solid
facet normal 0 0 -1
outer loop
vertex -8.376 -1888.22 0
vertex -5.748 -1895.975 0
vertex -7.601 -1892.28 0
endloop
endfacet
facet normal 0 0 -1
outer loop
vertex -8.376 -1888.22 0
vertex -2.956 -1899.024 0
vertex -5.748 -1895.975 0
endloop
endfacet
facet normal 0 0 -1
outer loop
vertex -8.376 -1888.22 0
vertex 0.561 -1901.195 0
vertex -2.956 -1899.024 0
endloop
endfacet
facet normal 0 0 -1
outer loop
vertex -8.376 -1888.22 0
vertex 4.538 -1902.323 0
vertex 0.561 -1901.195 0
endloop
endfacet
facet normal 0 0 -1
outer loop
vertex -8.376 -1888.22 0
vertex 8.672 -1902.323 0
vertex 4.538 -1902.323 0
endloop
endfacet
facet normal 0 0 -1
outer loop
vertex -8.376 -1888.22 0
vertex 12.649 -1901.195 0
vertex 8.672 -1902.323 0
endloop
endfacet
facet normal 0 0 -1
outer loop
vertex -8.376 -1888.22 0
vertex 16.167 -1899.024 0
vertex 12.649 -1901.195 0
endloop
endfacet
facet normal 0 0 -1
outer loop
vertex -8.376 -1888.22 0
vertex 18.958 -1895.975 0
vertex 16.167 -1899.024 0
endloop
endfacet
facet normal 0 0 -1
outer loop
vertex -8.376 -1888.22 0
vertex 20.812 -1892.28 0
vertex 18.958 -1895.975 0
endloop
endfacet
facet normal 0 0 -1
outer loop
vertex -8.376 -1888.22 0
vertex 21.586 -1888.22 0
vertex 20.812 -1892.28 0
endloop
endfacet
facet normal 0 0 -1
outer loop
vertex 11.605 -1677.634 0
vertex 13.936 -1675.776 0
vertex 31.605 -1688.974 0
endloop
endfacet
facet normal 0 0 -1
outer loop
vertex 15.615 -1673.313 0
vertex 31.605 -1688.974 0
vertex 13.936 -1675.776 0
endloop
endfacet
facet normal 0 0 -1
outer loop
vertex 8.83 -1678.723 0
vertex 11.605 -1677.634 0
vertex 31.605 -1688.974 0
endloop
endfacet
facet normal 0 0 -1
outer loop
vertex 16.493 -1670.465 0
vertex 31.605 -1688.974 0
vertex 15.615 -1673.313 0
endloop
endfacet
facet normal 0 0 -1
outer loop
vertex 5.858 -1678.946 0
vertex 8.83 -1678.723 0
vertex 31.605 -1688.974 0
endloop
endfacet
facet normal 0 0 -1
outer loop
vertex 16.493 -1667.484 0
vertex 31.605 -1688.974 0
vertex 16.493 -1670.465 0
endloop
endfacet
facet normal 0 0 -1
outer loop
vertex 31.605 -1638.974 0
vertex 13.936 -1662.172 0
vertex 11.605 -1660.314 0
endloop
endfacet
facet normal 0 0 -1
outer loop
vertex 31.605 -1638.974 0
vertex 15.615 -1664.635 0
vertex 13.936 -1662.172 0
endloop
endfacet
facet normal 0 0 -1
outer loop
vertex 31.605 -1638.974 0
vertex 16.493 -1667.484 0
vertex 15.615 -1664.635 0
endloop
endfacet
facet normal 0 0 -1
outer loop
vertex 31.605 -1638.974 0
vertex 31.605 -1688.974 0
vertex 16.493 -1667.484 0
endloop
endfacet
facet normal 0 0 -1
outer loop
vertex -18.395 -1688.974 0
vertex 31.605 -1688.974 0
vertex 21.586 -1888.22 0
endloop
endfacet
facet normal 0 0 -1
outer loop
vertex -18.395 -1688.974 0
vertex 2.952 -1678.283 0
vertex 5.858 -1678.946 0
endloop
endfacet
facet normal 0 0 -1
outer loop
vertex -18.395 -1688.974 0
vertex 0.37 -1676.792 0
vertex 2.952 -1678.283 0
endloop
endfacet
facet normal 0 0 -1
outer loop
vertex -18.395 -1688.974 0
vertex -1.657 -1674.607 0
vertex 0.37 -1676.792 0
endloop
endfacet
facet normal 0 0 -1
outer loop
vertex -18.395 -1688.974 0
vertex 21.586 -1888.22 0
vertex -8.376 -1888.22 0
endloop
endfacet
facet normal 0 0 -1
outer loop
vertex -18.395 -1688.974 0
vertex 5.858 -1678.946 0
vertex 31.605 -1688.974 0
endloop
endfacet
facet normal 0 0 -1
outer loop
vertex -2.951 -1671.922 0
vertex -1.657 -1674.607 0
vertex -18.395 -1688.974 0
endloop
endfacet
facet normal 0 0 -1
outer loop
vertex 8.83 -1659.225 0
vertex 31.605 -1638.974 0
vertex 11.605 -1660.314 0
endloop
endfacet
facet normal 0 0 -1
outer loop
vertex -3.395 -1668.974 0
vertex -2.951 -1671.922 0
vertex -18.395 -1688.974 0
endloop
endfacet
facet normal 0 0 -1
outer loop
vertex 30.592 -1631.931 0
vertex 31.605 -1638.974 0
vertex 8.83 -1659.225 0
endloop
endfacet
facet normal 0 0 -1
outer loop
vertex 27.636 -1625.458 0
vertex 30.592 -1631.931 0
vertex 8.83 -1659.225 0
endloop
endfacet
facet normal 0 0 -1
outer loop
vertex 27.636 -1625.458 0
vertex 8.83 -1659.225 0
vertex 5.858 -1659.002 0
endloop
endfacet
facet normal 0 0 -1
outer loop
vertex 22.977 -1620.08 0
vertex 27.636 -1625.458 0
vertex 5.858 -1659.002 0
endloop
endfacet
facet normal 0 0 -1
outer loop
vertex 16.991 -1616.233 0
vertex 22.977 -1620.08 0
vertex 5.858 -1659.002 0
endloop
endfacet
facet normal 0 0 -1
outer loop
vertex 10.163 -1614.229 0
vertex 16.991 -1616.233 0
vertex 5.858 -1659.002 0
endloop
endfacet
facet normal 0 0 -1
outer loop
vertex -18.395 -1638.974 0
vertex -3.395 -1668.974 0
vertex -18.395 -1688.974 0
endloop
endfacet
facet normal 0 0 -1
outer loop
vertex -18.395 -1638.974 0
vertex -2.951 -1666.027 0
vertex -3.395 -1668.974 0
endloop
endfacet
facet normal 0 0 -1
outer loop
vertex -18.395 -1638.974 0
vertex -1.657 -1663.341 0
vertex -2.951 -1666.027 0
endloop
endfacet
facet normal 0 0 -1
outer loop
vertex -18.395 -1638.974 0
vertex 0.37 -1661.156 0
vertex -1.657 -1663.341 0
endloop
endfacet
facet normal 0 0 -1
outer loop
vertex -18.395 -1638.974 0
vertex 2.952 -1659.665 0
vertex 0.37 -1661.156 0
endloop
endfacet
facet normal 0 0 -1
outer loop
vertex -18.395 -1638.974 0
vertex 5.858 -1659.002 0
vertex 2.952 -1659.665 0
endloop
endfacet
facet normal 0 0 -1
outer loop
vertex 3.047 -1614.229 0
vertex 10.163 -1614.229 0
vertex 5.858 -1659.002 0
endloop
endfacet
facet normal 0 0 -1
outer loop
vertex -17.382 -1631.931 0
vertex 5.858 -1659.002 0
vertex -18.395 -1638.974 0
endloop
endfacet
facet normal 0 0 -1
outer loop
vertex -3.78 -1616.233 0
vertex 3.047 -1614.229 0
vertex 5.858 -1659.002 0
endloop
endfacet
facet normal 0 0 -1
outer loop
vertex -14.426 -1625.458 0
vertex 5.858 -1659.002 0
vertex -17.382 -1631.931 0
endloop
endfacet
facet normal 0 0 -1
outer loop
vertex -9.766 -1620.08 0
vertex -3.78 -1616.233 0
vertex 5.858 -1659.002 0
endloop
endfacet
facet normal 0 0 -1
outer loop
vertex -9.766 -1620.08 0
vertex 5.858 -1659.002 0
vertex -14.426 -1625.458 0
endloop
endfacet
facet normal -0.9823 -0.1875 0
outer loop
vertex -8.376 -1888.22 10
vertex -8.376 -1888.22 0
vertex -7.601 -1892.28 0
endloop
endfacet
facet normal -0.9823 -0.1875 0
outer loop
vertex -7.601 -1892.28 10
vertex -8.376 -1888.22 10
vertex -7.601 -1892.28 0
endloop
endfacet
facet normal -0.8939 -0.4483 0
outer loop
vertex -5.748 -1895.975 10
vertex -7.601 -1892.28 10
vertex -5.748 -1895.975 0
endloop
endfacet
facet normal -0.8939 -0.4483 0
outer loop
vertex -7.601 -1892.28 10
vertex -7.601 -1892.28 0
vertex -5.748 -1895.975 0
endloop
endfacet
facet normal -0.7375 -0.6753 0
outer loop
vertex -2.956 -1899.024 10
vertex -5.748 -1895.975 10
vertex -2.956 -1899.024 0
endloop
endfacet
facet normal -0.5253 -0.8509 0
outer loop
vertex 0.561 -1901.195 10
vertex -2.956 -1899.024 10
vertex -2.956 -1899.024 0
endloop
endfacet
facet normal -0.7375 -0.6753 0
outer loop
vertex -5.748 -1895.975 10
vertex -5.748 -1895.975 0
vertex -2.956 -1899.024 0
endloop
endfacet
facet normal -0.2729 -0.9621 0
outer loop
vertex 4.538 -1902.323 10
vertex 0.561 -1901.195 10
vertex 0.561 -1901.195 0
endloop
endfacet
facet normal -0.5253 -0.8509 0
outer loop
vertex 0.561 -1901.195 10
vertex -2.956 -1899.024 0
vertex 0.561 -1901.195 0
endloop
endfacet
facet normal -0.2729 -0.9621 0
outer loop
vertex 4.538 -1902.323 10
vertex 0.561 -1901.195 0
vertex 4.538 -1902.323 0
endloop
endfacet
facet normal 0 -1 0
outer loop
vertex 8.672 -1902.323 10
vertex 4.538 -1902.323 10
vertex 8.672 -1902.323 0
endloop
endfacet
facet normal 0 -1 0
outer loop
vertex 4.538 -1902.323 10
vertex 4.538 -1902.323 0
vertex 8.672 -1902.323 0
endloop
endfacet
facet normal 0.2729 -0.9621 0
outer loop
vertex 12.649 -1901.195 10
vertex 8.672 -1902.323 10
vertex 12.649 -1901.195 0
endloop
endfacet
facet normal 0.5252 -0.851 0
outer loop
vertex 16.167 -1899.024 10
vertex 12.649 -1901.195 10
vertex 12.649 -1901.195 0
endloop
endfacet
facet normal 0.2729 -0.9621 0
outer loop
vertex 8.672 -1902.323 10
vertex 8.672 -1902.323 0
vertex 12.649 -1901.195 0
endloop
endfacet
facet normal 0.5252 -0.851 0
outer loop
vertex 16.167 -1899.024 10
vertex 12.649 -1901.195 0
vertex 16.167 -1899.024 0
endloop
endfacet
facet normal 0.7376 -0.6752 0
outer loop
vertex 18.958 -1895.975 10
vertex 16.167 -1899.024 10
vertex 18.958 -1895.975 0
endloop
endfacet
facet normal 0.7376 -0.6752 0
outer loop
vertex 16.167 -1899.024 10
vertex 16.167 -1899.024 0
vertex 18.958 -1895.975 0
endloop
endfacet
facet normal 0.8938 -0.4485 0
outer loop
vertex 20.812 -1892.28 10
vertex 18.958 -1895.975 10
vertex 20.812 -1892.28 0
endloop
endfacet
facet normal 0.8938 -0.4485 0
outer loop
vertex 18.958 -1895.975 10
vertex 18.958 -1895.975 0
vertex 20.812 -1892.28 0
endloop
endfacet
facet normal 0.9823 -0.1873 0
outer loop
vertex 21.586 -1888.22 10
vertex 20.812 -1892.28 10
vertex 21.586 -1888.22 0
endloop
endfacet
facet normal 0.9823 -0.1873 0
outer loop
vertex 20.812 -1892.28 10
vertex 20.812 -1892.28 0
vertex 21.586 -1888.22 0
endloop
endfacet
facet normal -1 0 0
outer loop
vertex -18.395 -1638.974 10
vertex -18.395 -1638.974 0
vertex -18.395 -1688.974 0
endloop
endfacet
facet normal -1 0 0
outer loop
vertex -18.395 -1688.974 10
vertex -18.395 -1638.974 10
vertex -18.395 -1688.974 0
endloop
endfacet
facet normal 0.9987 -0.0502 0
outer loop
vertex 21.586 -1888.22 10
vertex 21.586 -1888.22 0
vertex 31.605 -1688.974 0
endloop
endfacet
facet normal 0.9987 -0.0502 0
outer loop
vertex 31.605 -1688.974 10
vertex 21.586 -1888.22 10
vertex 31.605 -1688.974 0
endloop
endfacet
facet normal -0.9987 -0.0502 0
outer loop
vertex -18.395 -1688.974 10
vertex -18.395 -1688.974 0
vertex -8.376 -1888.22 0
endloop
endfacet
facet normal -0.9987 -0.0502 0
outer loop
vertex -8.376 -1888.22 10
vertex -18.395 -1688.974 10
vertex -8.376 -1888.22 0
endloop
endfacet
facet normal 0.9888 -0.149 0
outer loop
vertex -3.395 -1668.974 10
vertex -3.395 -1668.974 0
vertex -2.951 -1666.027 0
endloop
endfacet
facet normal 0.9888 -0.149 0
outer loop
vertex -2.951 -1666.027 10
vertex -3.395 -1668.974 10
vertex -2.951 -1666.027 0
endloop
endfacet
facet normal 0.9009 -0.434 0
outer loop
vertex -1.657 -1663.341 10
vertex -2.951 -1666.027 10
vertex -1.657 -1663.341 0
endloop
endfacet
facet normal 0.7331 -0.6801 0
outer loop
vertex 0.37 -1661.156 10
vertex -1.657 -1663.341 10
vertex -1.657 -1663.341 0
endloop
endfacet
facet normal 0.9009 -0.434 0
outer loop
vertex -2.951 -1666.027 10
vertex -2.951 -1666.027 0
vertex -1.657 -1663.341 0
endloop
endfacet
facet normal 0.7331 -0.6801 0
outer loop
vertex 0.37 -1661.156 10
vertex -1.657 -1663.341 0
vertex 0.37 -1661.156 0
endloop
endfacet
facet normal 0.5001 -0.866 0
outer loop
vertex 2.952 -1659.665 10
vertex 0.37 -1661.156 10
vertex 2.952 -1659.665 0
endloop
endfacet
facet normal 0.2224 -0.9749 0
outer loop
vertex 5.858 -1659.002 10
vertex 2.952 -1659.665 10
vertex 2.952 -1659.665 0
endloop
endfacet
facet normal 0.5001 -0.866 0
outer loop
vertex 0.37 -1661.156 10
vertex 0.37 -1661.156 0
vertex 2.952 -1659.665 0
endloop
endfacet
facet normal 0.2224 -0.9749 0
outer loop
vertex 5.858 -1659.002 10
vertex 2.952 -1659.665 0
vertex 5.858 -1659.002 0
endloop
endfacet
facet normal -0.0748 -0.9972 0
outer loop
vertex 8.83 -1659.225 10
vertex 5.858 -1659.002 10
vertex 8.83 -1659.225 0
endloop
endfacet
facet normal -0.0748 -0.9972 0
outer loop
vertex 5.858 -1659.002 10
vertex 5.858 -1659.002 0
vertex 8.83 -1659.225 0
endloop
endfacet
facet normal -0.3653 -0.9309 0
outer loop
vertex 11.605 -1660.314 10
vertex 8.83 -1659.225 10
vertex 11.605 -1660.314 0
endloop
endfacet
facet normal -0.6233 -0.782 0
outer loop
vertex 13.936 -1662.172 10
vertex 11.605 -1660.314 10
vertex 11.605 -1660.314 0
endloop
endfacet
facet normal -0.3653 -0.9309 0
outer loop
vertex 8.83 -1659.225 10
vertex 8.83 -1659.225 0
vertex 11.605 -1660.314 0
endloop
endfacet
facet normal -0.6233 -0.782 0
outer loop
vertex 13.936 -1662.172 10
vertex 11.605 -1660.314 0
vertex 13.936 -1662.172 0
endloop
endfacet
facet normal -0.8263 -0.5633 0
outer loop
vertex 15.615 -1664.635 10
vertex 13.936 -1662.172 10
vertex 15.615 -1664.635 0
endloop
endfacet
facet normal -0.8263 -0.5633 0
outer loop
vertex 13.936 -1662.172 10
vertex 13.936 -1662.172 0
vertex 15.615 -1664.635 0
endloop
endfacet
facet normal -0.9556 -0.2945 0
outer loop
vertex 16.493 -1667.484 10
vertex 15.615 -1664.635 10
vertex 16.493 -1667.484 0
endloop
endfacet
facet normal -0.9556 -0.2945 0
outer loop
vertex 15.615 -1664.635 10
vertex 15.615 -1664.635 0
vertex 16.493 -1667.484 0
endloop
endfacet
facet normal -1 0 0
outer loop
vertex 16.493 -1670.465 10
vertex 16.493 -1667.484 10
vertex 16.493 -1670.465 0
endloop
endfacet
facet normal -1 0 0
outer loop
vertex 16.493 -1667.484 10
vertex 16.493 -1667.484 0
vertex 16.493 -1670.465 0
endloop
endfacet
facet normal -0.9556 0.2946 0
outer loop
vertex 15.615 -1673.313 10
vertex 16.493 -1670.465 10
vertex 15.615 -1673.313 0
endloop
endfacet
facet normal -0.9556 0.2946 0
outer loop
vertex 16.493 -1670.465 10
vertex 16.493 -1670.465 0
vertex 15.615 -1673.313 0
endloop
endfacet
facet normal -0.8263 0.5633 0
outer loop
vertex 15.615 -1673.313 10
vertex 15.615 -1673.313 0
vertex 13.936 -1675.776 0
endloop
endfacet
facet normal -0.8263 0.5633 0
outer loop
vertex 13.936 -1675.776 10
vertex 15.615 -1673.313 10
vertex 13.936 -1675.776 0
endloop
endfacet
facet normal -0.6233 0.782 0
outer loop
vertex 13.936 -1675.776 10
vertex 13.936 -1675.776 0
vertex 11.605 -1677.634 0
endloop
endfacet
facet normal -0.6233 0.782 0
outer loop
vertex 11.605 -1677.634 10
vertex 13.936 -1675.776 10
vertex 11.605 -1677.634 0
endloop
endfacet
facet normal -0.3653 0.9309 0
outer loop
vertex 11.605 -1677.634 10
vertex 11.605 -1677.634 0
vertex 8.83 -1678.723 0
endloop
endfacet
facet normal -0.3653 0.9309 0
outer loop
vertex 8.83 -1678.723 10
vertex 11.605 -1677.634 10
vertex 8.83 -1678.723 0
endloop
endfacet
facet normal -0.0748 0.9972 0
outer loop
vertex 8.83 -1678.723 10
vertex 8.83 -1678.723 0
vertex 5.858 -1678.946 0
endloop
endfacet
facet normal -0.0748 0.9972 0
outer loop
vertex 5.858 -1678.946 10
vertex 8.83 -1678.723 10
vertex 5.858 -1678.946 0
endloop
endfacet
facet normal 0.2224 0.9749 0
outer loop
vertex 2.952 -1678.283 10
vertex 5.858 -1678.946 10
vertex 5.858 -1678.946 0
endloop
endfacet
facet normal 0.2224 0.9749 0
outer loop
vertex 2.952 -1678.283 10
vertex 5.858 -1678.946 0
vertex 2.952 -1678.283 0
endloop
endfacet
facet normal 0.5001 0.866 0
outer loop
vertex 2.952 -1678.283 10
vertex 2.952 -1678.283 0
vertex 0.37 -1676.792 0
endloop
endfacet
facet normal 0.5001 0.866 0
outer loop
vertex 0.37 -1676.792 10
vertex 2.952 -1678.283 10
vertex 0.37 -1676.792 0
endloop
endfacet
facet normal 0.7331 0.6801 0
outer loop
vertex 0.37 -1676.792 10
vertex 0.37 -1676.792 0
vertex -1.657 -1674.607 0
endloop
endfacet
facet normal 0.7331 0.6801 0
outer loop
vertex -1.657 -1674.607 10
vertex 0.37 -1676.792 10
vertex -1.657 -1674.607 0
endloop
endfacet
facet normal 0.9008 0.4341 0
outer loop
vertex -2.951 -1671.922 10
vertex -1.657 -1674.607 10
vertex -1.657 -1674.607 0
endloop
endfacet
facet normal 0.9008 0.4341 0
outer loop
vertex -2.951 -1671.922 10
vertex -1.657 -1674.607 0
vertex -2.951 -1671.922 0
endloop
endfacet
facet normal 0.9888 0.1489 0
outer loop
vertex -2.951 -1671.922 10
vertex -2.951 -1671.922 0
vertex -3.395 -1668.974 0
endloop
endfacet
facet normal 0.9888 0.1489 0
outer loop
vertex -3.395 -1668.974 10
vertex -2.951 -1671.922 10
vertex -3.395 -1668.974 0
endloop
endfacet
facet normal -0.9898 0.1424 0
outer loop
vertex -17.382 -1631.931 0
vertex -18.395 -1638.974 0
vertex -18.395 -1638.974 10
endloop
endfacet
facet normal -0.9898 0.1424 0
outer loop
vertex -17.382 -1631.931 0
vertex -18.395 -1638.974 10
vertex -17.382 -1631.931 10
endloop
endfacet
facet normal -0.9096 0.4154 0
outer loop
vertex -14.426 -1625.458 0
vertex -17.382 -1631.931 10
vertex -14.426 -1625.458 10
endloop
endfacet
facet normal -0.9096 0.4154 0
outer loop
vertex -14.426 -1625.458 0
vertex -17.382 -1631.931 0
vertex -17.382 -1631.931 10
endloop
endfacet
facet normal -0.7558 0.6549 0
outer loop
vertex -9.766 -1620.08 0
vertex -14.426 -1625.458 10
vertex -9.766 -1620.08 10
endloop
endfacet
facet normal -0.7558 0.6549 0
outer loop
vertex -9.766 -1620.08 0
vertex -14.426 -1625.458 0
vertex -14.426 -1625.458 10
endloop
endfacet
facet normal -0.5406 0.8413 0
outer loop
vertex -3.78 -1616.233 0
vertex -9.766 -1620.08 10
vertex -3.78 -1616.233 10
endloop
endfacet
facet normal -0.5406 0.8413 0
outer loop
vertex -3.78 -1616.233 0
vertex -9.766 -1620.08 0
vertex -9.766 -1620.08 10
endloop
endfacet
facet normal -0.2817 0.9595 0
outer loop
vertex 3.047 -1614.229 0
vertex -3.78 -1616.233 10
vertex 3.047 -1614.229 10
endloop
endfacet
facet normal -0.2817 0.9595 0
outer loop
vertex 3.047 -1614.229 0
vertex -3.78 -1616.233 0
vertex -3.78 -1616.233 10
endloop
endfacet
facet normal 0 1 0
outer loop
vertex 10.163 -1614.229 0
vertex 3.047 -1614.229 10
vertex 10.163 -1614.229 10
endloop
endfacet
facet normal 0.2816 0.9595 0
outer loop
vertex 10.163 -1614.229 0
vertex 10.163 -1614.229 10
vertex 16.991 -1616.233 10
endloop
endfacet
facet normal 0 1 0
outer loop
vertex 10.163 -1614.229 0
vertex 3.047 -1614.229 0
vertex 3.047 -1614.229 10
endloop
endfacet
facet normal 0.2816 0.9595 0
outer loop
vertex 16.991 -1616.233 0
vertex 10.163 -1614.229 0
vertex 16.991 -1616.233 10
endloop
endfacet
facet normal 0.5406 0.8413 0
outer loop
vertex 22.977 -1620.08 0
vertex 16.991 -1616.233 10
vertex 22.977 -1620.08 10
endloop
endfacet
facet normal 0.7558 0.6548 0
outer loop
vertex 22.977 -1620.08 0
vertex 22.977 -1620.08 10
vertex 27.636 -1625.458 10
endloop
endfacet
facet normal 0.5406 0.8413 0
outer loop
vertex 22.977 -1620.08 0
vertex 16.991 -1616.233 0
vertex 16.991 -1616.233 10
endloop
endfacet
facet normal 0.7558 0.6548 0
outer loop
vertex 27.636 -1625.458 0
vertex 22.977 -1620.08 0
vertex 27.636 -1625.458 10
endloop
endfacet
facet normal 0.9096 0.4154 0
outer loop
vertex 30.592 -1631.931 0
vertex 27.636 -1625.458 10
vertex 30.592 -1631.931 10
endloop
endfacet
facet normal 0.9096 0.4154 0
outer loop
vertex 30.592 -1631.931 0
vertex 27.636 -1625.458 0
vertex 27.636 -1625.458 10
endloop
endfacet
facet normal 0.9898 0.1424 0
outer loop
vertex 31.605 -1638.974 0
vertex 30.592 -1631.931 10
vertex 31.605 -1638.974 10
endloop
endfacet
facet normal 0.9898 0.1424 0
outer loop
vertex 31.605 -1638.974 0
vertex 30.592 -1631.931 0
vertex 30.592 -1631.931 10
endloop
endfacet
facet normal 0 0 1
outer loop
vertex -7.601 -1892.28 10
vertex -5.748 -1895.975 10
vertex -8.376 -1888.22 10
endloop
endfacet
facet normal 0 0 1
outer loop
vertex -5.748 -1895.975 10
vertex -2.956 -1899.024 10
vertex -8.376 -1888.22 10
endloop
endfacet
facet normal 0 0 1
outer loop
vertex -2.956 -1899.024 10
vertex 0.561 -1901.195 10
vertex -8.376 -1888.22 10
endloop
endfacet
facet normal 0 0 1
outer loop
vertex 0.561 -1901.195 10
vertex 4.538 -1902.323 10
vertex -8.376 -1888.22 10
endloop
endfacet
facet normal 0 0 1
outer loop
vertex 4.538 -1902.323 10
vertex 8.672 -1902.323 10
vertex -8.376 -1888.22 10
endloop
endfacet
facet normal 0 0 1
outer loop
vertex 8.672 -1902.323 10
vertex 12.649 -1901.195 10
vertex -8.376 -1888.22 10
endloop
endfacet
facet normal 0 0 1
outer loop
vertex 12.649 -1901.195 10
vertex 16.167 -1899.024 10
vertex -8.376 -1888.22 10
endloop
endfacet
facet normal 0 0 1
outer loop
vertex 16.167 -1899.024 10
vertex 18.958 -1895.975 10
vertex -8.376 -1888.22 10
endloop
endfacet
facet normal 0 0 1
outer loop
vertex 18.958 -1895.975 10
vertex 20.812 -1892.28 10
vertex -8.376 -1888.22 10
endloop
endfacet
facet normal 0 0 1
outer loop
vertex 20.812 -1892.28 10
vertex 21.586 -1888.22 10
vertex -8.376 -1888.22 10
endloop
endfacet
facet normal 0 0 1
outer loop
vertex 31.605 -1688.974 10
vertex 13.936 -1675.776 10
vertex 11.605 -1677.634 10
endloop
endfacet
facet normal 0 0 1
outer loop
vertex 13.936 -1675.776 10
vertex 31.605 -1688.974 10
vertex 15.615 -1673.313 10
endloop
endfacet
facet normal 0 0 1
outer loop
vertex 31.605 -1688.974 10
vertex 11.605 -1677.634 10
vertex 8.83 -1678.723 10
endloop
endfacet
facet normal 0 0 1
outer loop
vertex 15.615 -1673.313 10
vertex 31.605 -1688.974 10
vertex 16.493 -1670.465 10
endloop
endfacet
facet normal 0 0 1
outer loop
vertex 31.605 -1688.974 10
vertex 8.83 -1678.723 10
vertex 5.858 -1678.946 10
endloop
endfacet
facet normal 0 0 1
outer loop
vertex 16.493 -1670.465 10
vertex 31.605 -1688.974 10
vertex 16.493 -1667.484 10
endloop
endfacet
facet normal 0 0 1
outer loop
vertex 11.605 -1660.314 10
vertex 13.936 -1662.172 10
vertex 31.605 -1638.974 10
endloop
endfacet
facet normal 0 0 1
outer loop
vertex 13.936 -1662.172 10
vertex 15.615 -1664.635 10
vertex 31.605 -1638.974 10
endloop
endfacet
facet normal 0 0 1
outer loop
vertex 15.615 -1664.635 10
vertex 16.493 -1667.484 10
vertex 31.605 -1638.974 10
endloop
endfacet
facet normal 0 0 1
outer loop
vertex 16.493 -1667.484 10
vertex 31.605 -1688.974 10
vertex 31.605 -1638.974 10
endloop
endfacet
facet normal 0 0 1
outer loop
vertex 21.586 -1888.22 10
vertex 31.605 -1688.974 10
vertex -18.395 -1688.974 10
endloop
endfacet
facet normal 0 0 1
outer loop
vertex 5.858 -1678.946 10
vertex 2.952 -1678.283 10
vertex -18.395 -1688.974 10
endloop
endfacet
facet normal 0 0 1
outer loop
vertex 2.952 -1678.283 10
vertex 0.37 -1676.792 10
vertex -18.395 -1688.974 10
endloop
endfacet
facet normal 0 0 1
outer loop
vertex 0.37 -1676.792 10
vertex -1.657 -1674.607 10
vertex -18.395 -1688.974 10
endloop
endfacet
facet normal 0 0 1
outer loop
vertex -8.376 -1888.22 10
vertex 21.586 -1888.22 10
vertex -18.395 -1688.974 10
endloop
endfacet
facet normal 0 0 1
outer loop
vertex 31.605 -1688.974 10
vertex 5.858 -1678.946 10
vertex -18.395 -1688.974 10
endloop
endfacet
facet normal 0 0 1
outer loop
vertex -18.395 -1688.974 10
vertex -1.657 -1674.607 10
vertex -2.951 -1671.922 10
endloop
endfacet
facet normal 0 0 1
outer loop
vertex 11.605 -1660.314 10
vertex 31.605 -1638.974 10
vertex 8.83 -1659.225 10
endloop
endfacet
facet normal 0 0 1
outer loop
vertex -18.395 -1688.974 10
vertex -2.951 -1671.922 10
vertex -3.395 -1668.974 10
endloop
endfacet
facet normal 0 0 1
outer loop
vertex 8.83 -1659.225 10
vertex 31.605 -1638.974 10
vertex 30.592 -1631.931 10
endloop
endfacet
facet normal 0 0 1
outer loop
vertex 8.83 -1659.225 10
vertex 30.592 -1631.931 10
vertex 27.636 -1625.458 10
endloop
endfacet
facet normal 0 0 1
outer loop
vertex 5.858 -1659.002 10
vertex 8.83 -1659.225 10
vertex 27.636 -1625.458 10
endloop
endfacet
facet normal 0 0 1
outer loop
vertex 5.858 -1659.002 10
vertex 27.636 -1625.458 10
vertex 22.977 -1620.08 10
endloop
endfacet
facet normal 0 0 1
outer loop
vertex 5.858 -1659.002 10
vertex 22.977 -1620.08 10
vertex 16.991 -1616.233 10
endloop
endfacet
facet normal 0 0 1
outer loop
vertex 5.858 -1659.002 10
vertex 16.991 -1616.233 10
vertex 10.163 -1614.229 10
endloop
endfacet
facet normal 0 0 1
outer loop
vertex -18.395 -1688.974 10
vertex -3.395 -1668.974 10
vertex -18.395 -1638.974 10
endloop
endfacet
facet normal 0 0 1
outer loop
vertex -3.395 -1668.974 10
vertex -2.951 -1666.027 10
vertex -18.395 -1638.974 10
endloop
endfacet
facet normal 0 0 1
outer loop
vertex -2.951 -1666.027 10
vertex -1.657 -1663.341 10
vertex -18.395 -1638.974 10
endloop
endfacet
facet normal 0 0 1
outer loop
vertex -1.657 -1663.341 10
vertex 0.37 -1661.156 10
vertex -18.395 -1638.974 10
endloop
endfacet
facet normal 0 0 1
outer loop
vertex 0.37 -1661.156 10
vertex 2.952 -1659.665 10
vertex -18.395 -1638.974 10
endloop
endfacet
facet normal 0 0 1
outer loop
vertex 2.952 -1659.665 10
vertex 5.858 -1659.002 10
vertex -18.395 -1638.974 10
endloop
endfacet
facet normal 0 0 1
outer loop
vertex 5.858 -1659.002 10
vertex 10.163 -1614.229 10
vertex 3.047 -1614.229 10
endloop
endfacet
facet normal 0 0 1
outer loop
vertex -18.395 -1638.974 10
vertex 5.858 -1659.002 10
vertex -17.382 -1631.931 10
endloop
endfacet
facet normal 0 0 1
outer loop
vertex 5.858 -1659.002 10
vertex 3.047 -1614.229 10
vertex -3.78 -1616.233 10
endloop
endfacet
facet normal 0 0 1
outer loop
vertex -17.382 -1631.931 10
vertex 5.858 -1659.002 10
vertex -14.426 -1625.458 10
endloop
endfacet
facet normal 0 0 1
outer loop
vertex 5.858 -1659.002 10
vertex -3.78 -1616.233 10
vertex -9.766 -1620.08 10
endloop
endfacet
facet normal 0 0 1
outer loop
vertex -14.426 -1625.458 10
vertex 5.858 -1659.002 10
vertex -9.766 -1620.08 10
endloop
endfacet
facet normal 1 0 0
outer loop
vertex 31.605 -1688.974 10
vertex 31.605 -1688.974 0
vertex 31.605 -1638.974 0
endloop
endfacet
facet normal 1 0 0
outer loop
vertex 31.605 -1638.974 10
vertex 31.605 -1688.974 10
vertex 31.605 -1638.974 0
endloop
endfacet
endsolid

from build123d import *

# Parameters (mm, degrees)
SKETCH1_R           = 15
BOSS_EXTRUDE3_DEPTH = 10
BOSS_EXTRUDE4_DEPTH = 10
SKETCH3_R           = 10
CUT_EXTRUDE1_DEPTH  = 1903.755203621


with BuildPart() as part:
    # Sketch1 → Boss-Extrude3 (new body)
    with BuildSketch(Plane.XY):
        with Locations((6.605137187, -1887.466420258)):
            Circle(SKETCH1_R)
        with BuildLine():
            Line((31.605137187, -1638.974115082), (-18.394862813, -1638.974115082))
            Line((-18.394862813, -1638.974115082), (-18.394862813, -1688.974115082))
            Line((-18.394862813, -1688.974115082), (-8.375934863, -1888.219733093))
            ThreePointArc((-8.375934863, -1888.219733093), (6.228361891, -1872.471152992), (21.605137187, -1887.466420258))
            ThreePointArc((21.605137187, -1887.466420258), (21.600404453, -1887.843195554), (21.586209238, -1888.219733093))
            Line((21.586209238, -1888.219733093), (31.605137187, -1688.974115082))
            Line((31.605137187, -1688.974115082), (31.605137187, -1638.974115082))
        make_face()
    extrude(amount=BOSS_EXTRUDE3_DEPTH)

    # Sketch2 → Boss-Extrude4 (add)
    with BuildSketch(Plane(origin=(0, 0, 0), x_dir=(-1, 0, 0), z_dir=(0, 0, -1))):
        with BuildLine():
            Line((-31.605137187, -1638.974115082), (18.394862813, -1638.974115082))
            ThreePointArc((18.394862813, -1638.974115082), (-6.605137187, -1613.974115082), (-31.605137187, -1638.974115082))
        make_face()
    extrude(amount=-BOSS_EXTRUDE4_DEPTH)

    # Sketch3 → Cut-Extrude1 (cut, through all)
    with BuildSketch(Plane(origin=(0, 0, 0), x_dir=(-1, 0, 0), z_dir=(0, 0, -1))):
        with Locations((-6.605137187, -1668.974115082)):
            Circle(SKETCH3_R)
    extrude(amount=-CUT_EXTRUDE1_DEPTH, mode=Mode.SUBTRACT)


solid = part.part
